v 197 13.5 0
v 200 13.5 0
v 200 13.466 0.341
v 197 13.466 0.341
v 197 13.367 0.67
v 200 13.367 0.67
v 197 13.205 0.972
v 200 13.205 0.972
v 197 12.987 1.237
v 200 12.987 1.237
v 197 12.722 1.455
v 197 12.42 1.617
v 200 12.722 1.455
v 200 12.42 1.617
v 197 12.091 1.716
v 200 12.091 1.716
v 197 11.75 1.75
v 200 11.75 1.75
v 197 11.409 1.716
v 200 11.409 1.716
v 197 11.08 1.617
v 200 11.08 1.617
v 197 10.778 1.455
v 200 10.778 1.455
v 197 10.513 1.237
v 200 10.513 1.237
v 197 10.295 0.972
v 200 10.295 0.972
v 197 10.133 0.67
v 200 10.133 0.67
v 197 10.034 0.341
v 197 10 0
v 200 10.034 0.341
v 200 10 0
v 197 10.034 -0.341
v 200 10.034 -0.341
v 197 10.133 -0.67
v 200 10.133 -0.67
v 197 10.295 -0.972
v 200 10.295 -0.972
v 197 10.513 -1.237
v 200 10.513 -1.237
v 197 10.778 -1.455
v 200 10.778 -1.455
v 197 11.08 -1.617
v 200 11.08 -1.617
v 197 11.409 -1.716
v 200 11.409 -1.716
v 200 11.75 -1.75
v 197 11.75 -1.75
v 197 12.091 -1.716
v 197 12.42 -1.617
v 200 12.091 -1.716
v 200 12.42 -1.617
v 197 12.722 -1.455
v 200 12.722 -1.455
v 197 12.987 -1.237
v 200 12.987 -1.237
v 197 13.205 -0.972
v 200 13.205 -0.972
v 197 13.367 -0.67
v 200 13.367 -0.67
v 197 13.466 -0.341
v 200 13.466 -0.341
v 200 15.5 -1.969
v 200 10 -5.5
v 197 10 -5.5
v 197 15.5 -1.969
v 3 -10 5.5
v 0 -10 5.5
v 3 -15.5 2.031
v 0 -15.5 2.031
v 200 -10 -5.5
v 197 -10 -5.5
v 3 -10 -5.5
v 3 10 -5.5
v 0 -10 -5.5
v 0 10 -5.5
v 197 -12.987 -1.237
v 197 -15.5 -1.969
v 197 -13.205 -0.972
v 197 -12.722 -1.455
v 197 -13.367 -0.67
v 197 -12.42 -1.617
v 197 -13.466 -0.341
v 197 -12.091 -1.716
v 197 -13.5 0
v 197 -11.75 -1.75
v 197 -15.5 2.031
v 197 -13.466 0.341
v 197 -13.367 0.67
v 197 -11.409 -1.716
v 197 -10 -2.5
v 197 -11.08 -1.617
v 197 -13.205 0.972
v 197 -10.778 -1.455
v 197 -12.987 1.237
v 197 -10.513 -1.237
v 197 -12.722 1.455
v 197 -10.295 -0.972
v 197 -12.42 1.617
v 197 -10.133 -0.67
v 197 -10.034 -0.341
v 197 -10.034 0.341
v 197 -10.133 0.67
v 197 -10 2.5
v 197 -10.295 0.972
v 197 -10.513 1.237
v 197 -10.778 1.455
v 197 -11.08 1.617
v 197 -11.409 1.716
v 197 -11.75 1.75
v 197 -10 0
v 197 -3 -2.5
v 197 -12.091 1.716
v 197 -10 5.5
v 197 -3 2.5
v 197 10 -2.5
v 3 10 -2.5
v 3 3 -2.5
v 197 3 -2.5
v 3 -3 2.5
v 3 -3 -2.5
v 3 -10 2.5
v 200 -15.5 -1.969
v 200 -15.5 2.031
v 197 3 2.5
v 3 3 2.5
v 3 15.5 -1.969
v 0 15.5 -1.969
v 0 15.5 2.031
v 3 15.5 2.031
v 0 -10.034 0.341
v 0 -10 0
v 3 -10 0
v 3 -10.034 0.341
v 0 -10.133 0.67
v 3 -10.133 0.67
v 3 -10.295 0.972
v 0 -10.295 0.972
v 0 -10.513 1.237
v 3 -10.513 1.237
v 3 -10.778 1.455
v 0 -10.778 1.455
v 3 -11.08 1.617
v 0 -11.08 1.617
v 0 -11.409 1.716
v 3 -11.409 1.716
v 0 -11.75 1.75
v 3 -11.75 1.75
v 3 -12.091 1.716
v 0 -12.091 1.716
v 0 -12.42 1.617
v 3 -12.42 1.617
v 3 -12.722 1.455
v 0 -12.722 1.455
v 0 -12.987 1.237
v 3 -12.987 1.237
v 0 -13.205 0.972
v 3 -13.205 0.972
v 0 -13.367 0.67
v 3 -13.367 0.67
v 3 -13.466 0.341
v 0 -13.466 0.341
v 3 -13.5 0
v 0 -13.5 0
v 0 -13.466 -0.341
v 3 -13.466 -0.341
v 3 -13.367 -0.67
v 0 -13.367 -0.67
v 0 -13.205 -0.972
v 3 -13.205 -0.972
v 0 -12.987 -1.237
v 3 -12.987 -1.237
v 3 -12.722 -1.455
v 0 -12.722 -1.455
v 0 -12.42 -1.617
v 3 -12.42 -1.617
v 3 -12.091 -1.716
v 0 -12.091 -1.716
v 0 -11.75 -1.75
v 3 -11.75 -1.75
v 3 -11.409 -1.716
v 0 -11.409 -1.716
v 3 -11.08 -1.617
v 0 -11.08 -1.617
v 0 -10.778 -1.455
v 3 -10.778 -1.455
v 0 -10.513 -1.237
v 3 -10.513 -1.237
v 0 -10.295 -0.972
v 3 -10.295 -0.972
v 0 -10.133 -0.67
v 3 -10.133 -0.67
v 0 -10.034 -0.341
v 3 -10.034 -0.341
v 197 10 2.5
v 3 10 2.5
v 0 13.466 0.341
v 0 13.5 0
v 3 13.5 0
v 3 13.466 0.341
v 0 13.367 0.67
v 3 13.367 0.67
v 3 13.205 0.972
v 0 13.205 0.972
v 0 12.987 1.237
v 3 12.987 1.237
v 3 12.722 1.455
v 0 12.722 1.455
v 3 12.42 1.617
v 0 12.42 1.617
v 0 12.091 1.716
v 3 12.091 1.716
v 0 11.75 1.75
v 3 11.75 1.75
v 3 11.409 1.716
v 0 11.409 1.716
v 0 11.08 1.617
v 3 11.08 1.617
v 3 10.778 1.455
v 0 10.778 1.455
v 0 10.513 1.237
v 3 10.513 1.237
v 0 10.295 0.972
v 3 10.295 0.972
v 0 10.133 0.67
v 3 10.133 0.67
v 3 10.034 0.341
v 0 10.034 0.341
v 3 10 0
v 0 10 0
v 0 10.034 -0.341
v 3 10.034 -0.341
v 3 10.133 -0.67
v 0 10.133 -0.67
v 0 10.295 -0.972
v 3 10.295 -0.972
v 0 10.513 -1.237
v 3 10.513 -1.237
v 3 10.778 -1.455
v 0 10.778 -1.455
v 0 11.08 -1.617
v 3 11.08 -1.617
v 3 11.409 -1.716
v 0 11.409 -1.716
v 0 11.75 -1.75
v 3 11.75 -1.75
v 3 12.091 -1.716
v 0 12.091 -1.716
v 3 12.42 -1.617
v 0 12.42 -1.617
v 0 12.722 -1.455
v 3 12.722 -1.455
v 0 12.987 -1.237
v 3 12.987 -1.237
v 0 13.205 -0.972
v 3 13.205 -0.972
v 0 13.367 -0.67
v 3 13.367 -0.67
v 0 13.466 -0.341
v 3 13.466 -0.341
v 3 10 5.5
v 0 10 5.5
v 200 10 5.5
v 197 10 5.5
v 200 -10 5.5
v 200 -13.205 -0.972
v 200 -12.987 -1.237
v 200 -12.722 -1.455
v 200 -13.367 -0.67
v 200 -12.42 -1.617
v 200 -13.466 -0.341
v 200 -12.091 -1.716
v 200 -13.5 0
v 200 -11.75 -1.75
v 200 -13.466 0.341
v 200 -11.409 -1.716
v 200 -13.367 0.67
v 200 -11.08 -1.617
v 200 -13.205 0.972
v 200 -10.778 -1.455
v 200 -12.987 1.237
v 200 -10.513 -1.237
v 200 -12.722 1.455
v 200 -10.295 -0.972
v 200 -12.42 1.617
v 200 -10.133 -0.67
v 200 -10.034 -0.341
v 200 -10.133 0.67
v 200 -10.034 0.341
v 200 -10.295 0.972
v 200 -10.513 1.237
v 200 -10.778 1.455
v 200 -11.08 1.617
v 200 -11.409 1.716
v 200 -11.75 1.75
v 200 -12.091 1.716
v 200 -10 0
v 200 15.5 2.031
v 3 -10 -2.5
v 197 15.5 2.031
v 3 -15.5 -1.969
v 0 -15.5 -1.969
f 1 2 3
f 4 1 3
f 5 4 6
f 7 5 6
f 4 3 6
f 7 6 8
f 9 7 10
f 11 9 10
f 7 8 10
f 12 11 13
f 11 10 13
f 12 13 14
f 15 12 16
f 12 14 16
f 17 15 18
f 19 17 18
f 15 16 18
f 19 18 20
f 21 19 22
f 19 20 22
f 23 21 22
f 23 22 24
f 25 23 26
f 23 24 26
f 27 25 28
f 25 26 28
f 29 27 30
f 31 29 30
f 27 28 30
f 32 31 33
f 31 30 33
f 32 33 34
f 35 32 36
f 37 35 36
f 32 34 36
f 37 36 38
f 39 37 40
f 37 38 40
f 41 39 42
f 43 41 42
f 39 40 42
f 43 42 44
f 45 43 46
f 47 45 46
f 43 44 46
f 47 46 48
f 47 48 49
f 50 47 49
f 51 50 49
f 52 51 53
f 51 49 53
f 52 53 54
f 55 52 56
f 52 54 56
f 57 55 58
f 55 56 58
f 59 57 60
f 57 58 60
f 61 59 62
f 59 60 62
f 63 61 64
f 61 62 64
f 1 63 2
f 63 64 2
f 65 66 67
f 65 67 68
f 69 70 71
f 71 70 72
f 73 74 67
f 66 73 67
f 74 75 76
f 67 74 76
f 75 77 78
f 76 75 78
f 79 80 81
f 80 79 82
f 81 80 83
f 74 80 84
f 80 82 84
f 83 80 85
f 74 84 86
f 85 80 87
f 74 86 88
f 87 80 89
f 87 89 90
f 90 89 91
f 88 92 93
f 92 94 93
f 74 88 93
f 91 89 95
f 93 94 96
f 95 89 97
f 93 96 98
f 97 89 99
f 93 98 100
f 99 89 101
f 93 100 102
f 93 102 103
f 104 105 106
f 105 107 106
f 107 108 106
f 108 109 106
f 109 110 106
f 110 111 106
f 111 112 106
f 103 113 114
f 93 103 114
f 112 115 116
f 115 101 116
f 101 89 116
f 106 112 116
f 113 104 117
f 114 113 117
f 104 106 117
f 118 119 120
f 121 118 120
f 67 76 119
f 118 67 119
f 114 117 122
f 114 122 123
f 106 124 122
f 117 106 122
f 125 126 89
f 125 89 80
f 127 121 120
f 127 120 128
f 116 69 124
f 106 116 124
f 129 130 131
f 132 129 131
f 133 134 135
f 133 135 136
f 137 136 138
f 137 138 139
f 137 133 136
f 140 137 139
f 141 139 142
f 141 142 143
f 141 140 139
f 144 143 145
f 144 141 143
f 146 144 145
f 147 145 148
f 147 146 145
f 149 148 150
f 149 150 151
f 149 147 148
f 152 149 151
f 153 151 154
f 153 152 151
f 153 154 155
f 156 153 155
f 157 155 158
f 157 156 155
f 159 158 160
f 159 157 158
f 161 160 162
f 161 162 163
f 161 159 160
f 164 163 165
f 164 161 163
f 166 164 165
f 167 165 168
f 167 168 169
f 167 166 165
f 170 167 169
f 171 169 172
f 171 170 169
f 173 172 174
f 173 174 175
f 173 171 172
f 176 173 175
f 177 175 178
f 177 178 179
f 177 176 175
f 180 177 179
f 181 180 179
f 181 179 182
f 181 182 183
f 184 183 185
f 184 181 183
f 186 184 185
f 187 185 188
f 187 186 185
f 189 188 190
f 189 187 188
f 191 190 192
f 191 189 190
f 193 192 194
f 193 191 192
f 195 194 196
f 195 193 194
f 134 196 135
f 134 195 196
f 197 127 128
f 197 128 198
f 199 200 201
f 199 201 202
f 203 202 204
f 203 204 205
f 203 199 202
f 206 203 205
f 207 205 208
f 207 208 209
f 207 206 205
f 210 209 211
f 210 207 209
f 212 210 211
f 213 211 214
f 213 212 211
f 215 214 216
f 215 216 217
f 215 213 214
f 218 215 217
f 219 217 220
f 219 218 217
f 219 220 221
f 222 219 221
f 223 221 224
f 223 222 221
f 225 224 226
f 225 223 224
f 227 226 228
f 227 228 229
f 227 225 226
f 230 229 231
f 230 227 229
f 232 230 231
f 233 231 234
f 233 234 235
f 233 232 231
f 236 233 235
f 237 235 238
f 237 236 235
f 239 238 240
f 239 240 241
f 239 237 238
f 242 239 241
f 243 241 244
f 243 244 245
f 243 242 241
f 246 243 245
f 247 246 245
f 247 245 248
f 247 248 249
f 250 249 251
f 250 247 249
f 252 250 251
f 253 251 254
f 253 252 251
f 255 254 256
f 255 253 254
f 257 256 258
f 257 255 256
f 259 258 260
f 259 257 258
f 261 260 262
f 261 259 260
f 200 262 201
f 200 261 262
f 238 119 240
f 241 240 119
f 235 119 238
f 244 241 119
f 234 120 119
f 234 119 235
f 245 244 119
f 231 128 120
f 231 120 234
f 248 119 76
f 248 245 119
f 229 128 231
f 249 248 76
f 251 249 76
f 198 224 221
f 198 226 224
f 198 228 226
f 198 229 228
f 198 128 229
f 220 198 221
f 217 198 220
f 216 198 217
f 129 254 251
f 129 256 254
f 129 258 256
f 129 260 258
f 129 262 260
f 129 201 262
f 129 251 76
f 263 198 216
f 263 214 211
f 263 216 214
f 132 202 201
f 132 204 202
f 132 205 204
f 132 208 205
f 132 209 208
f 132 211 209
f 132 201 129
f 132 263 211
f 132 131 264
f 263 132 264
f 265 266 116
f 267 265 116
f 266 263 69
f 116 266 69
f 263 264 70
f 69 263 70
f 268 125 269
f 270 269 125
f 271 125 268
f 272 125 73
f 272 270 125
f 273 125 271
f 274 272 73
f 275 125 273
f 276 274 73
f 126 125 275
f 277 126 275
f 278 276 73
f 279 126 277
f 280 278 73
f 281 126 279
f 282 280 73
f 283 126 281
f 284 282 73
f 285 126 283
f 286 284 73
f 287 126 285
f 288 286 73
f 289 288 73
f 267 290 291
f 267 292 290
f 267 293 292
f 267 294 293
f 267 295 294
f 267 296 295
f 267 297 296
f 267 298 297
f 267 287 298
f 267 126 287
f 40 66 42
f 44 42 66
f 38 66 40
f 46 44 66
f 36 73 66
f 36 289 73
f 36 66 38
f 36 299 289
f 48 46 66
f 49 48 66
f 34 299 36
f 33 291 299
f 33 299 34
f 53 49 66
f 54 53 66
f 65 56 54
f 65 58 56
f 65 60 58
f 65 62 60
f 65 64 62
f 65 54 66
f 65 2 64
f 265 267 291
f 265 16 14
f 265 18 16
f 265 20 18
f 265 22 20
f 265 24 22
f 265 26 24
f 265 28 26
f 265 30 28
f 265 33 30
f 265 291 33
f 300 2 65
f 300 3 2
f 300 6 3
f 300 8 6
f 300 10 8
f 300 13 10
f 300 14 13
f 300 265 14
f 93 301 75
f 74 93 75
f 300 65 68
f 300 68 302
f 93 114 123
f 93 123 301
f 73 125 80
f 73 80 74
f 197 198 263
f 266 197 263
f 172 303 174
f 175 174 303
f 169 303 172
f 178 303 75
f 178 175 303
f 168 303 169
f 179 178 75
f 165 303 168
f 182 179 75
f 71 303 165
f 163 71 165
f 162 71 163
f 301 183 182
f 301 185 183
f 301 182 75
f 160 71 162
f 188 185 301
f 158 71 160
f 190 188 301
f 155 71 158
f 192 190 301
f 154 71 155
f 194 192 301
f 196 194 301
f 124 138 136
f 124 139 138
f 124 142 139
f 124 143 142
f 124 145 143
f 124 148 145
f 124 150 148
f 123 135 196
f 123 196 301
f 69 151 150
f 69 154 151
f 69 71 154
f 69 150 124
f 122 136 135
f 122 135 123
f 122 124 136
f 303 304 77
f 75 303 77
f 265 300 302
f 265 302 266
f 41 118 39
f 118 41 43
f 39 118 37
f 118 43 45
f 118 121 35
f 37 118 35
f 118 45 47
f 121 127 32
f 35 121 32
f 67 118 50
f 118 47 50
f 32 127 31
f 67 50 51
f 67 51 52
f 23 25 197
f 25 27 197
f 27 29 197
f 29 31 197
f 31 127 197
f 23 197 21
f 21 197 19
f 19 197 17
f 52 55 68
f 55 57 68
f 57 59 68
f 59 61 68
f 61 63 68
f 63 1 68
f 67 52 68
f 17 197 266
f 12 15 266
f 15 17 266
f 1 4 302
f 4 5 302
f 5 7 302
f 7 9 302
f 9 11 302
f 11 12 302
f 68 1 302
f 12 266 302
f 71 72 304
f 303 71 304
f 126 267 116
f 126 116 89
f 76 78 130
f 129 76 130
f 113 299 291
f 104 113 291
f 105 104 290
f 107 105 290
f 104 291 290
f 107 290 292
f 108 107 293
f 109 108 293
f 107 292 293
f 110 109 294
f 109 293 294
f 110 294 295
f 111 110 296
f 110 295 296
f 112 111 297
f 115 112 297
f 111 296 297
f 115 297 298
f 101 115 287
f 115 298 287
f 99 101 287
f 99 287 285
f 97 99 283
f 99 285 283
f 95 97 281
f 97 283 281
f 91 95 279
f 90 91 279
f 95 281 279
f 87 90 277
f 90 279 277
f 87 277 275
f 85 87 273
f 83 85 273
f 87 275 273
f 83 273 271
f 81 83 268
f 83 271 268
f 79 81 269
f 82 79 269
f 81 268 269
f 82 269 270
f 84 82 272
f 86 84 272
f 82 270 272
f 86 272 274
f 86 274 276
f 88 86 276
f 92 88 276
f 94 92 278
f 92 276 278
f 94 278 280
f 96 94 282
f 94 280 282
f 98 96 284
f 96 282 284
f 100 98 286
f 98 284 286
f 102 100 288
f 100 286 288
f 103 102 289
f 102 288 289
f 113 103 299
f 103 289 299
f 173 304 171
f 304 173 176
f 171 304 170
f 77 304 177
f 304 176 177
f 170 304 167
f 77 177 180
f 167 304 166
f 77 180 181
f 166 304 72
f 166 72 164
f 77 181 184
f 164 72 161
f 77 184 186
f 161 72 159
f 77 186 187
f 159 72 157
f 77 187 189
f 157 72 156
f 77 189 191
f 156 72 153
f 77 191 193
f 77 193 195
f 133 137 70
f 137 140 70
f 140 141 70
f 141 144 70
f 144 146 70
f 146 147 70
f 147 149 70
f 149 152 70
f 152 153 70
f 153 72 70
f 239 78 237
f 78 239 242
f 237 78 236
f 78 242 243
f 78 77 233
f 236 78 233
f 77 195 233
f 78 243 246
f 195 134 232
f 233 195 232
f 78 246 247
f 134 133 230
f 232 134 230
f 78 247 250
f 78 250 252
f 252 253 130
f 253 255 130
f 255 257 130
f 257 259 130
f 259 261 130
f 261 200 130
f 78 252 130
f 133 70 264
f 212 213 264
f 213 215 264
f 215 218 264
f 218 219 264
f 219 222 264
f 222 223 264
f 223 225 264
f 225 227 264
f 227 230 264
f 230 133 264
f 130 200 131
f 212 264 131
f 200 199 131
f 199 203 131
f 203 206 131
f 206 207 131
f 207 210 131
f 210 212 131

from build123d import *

# Parameters (mm, degrees)
F0_R     = 1.75
F1_DEPTH = 3
F2_DEPTH = 200
F3_R     = 1.75
F4_DEPTH = 3


with BuildPart() as f1:
    # F0 (on Right) → F1 (new body)
    with BuildSketch(Plane.YZ):
        Polygon((-3, 2.5), (-10, 2.5), (-10, 5.5), (-15.5, 2.03124969), (-15.5, -1.96875031), (-10, -5.5), (-10, -2.5), (-3, -2.5), align=None)
        with Locations((-11.75, 0)):
            Circle(F0_R, mode=Mode.SUBTRACT)
    extrude(amount=F1_DEPTH)



with BuildPart() as f1b:
    # F0 (on Right) → F1, piece 2 (new body)
    with BuildSketch(Plane.YZ):
        Polygon((15.5, 2.03124969), (10, 5.5), (10, 2.5), (3, 2.5), (3, -2.5), (10, -2.5), (10, -5.5), (15.5, -1.96875031), align=None)
        with Locations((11.75, 0)):
            Circle(F0_R, mode=Mode.SUBTRACT)
    extrude(amount=F1_DEPTH)


with BuildPart() as f1_1:
    add(f1.part)

    add(f1b.part)  # F2 merges F1b
    # F0 (on Right) → F2 (join)
    with BuildSketch(Plane.YZ):
        Polygon((-10, 5.5), (-10, 2.5), (-3, 2.5), (-3, -2.5), (-10, -2.5), (-10, -5.5), (10, -5.5), (10, -2.5), (3, -2.5), (3, 2.5), (10, 2.5), (10, 5.5), align=None)
    extrude(amount=F2_DEPTH)

    # F3 (on face) → F4 (join)
    with BuildSketch(Plane.YZ.offset(200)):
        Polygon((-3, 2.5), (-10, 2.5), (-10, 5.5), (-15.5, 2.03124969), (-15.5, -1.96875031), (-10, -5.5), (-10, -2.5), (-3, -2.5), align=None)
        with Locations((-11.75, 0)):
            Circle(F3_R, mode=Mode.SUBTRACT)
        Polygon((15.5, 2.03124969), (10, 5.5), (10, 2.5), (3, 2.5), (3, -2.5), (10, -2.5), (10, -5.5), (15.5, -1.96875031), align=None)
        with Locations((11.75, 0)):
            Circle(F3_R, mode=Mode.SUBTRACT)
    extrude(amount=-F4_DEPTH)


solid = f1_1.part
